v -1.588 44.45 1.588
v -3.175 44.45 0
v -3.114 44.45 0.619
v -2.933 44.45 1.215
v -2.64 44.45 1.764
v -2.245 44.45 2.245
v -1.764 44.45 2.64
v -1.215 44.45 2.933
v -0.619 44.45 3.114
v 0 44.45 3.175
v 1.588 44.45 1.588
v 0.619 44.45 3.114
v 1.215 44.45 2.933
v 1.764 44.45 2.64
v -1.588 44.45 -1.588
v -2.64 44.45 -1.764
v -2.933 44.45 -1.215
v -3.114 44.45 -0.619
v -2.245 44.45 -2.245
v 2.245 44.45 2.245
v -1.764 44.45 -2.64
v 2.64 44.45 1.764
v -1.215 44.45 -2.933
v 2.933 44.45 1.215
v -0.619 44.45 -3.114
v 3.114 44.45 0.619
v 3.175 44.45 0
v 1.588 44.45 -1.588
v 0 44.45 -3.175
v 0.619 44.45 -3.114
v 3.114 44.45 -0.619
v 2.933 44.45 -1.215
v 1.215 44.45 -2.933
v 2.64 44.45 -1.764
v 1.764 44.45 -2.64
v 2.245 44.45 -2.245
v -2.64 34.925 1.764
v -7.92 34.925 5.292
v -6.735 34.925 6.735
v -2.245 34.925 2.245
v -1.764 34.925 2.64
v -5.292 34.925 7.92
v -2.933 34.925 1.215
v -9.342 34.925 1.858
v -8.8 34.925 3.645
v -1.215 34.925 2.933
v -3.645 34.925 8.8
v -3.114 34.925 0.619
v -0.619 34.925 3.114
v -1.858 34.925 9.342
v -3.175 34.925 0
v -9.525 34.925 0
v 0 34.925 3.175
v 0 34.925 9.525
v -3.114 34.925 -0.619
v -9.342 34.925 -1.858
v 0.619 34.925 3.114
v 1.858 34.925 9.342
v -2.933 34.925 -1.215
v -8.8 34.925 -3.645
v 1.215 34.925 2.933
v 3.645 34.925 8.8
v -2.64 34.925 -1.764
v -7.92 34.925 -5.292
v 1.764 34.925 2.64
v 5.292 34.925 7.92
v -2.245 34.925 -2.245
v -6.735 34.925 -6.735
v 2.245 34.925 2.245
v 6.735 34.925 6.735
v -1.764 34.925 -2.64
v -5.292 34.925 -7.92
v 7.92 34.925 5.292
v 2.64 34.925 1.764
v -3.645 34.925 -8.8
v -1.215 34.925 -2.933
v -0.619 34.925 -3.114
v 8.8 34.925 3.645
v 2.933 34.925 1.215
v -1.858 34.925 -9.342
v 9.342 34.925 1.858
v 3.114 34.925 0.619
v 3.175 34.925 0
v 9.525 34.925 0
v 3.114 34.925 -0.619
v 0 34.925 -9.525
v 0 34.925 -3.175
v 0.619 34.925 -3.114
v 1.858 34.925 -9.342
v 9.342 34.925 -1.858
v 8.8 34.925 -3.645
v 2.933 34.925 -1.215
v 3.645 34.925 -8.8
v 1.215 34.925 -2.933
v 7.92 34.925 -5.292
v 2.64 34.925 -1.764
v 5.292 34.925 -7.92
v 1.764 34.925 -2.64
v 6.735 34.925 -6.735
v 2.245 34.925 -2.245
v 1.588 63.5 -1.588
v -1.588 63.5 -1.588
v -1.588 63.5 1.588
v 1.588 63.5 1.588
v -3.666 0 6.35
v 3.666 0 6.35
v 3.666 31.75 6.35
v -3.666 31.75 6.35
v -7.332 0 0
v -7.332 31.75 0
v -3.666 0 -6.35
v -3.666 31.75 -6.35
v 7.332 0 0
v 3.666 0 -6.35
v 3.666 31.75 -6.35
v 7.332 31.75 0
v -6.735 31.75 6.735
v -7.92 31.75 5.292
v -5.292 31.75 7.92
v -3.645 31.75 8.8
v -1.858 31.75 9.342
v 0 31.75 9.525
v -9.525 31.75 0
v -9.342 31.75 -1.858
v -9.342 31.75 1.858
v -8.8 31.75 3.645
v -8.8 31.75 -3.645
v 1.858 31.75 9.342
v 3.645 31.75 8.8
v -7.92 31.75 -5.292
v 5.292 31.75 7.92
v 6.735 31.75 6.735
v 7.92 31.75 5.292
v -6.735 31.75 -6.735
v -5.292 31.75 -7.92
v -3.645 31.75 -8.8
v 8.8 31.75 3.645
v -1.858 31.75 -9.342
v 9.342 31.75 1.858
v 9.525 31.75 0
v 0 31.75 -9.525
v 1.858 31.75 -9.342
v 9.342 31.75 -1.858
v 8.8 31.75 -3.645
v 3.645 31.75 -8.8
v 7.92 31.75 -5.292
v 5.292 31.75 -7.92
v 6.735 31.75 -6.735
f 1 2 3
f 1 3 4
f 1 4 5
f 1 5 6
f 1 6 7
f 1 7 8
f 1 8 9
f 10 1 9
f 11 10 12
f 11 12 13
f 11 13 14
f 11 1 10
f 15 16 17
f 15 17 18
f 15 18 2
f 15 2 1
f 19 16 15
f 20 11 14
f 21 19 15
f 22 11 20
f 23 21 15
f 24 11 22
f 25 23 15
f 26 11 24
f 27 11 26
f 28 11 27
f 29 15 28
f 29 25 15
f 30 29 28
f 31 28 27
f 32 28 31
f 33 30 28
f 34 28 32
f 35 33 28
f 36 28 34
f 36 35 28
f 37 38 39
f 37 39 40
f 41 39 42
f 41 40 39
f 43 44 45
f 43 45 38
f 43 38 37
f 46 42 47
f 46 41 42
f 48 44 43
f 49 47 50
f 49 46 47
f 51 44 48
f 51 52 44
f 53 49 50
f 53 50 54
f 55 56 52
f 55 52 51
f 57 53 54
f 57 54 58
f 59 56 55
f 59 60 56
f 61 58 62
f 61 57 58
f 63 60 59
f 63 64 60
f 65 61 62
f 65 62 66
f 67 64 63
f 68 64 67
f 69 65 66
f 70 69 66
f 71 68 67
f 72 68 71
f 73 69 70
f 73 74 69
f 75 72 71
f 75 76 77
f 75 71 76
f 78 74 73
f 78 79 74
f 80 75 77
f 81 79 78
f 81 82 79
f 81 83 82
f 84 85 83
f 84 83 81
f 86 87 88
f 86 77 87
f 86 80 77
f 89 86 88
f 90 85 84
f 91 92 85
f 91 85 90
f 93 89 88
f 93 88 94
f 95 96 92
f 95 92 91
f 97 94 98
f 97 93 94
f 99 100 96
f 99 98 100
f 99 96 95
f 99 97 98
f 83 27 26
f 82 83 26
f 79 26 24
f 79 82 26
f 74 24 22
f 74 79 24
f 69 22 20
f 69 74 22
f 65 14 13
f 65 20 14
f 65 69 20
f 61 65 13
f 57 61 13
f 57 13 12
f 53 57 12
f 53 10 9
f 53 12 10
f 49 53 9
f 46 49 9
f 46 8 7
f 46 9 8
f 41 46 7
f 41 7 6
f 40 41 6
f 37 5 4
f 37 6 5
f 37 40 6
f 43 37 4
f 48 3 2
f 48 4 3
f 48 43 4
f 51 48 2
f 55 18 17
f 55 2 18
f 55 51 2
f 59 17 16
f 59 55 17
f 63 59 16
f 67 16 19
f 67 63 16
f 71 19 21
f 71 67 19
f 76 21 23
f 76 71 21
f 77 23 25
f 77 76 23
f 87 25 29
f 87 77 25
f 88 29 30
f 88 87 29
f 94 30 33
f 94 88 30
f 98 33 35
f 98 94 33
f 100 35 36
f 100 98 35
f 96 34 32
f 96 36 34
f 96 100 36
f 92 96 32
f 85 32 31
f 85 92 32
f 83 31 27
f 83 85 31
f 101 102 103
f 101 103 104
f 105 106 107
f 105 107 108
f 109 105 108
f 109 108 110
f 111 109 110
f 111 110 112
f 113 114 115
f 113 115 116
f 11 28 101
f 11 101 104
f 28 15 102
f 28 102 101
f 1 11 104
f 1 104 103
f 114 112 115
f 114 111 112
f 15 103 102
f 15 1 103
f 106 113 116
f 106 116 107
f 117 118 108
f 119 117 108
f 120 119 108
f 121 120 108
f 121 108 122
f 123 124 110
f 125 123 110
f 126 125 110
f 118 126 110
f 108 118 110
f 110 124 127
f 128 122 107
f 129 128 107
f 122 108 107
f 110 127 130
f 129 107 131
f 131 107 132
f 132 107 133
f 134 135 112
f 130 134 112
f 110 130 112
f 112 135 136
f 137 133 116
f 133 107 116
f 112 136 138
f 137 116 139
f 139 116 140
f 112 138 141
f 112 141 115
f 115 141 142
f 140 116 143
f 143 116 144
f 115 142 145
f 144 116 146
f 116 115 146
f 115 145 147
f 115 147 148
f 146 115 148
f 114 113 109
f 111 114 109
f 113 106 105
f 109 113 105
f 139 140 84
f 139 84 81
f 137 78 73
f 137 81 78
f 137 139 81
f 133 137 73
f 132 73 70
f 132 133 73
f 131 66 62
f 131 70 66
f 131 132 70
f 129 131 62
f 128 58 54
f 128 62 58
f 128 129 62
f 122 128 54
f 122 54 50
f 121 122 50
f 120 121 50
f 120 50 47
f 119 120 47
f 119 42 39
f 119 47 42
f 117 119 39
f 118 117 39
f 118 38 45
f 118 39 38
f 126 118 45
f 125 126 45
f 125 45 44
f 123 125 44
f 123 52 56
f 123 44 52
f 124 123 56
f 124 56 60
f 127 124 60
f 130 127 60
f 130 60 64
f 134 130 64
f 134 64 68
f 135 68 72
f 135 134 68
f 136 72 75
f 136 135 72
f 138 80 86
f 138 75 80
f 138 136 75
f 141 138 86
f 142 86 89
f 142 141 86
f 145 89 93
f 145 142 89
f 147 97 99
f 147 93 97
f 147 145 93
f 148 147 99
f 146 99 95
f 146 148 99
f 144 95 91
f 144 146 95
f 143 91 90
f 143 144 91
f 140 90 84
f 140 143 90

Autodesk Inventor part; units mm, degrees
ref_plane "YZ Plane" through (0, 0, 0) normal (1, 0, 0) x (0, 1, 0)
ref_plane "XZ Plane" through (0, 0, 0) normal (0, 1, 0) x (-1, 0, 0)
ref_plane "XY Plane" through (0, 0, 0) normal (0, 0, 1) x (1, 0, 0)
sketch "Sketch1" plane through (0, 0, 0) normal (0, 1, 0) x (-1, 0, 0)
  line L0 (3.6662, 6.35) -> (7.3323, 0)
  line L1 (7.3323, 0) -> (3.6662, -6.35)
  line L2 (3.6662, -6.35) -> (-3.6662, -6.35)
  line L3 (-3.6662, -6.35) -> (-7.3323, 0)
  line L4 (-7.3323, 0) -> (-3.6662, 6.35)
  line L5 (-3.6662, 6.35) -> (3.6662, 6.35)
  point P0 (0, 0)
  point P1 (0, 0)
  dimension "d0" = 12.7
  dimension "d1" = 0
extrude "Extrusion1" add sketch "Sketch1" along normal blind 31.75
sketch "Sketch2" plane through (0, 31.75, 0) normal (0, 1, 0) x (1, 0, 0)
  circle A0 centre (0, 0) radius 9.525
  dimension "d4" = 19.05
extrude "Extrusion2" add sketch "Sketch2" along normal blind 3.175
sketch "Sketch3" plane through (0, 34.925, 0) normal (0, 1, 0) x (1, 0, 0)
  circle A0 centre (0, 0) radius 3.175
  dimension "d7" = 6.35
extrude "Extrusion3" add sketch "Sketch3" along normal blind 9.525
sketch "Sketch4" plane through (0, 44.45, 0) normal (0, 1, 0) x (1, 0, 0)
  line L0 (1.5875, -1.5875) -> (-1.5875, -1.5875)
  line L1 (-1.5875, -1.5875) -> (-1.5875, 1.5875)
  line L2 (-1.5875, 1.5875) -> (1.5875, 1.5875)
  line L3 (1.5875, 1.5875) -> (1.5875, -1.5875)
  circle A0 centre (0, 0) radius 3.175 projected
  line L4 (1.5875, -1.5875) -> (-1.5875, 1.5875) construction
  line L5 (-1.5875, -1.5875) -> (1.5875, 1.5875) construction
  dimension "d10" = 3.175
  dimension "d11" = 3.175
extrude "Extrusion4" add sketch "Sketch4" along normal blind 19.05 contours L0 L1 L2 L3
properties part number "vex to hex adapter"
